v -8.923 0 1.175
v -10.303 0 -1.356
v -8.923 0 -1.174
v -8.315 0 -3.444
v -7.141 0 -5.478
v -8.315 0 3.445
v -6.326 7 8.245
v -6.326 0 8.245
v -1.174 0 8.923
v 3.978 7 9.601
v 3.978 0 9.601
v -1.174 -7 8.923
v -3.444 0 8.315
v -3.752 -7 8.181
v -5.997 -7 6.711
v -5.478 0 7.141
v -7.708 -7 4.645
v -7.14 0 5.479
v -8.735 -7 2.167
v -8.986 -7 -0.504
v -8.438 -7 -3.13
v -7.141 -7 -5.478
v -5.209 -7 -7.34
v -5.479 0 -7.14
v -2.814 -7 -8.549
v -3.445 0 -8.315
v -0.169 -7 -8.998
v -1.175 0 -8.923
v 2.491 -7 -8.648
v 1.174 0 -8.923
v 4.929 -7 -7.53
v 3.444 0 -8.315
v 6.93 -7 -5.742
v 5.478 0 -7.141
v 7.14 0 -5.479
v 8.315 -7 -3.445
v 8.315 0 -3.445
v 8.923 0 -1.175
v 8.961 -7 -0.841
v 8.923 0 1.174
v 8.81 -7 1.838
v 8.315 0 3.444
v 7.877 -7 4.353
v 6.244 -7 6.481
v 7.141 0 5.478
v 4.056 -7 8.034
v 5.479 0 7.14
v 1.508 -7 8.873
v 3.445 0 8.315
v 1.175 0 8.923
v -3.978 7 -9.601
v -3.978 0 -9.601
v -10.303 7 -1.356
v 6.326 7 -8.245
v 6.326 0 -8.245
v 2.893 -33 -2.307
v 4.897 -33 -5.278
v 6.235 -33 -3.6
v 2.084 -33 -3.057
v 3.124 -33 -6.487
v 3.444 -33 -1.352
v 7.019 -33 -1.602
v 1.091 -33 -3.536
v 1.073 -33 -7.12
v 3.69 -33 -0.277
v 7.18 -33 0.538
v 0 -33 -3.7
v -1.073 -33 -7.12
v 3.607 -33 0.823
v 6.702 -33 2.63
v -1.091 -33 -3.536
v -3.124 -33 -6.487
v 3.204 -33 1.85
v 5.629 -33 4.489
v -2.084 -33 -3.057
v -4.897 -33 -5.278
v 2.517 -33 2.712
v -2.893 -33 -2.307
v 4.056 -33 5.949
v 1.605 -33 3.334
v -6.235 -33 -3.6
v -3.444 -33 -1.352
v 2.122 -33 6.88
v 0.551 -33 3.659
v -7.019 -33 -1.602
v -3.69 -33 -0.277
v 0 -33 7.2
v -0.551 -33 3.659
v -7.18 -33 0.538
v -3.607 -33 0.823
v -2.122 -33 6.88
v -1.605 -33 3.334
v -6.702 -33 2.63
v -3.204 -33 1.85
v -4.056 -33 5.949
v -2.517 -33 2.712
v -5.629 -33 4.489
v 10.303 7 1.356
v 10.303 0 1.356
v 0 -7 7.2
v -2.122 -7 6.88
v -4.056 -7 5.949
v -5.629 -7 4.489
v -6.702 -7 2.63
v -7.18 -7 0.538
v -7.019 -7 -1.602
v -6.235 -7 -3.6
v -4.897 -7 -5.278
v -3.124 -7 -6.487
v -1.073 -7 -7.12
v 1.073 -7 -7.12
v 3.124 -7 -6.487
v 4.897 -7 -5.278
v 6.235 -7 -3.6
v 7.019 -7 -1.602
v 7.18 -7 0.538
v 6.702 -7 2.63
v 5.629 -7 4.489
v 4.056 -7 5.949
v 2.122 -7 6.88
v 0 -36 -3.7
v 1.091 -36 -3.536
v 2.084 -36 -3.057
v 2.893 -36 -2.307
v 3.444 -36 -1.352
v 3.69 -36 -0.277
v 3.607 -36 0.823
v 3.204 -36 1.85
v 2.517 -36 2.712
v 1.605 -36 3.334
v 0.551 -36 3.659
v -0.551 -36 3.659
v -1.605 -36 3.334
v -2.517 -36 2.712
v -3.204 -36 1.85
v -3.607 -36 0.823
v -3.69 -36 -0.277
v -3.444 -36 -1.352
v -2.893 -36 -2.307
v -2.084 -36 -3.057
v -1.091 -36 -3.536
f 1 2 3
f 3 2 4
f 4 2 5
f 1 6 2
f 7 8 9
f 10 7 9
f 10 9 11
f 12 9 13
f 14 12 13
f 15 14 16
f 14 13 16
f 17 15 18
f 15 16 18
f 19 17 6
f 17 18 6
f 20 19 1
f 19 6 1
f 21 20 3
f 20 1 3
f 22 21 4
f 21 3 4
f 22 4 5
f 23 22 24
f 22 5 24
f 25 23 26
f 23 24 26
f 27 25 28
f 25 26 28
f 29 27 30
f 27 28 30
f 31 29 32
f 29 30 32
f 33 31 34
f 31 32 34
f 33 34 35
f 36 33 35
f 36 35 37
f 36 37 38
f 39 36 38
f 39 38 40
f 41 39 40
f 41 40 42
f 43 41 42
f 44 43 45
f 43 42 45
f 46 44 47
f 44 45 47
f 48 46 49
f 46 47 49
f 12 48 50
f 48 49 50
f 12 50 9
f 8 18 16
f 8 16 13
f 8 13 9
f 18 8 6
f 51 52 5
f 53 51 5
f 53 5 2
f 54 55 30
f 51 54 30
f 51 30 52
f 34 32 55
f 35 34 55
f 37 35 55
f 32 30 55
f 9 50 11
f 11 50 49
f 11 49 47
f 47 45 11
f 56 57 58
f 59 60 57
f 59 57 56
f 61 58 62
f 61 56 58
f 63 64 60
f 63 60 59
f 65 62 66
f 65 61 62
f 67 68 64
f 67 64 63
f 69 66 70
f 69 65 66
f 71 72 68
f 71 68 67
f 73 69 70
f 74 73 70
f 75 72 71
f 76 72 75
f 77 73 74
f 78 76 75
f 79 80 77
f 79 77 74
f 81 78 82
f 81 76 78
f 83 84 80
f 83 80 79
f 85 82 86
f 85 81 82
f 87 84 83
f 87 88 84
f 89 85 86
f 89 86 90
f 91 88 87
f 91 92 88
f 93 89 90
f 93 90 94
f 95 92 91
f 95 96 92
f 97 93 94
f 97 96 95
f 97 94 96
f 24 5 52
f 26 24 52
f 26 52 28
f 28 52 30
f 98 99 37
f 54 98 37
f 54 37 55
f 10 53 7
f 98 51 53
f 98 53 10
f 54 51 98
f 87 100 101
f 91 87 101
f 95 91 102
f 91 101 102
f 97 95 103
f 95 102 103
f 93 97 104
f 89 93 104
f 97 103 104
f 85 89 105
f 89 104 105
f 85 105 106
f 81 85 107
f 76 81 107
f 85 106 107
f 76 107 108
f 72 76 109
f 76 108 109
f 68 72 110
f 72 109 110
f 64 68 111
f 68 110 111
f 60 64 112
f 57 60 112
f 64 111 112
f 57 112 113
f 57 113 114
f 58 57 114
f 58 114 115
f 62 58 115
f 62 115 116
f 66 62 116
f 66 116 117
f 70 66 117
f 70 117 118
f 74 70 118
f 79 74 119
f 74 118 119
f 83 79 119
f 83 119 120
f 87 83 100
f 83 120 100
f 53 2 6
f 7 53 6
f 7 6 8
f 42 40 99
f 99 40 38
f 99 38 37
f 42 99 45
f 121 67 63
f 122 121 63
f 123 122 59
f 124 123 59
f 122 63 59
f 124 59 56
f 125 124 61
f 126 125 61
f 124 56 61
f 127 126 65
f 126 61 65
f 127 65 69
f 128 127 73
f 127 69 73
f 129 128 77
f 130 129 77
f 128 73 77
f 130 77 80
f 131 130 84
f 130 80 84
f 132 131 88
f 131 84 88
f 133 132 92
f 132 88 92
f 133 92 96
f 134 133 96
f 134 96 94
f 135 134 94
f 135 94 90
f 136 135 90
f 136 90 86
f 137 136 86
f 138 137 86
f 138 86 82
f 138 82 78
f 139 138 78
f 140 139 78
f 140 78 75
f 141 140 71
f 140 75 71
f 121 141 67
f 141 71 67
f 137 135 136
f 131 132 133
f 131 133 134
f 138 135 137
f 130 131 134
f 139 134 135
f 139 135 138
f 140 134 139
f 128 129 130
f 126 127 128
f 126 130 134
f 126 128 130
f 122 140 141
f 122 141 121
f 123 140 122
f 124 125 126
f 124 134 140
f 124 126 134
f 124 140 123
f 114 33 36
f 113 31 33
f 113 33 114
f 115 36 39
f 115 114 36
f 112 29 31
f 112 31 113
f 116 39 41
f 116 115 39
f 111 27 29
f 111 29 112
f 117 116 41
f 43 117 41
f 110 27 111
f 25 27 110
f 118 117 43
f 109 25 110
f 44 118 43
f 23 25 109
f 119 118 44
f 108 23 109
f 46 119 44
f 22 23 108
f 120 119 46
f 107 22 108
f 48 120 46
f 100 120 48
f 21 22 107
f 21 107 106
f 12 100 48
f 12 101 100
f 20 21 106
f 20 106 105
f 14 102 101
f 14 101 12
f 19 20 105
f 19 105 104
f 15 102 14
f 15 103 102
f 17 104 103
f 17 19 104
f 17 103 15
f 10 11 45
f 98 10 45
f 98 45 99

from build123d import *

# Parameters (mm, degrees)
EXTRUDE_1_DEPTH = 7
SKETCH_2_R      = 9
EXTRUDE_2_DEPTH = 7
SKETCH_3_R      = 7.2
EXTRUDE_3_DEPTH = 26
SKETCH_4_R      = 3.7
EXTRUDE_4_DEPTH = 3


with BuildPart() as part:
    # 草图1 → 凸台-拉伸1 (new body)
    with BuildSketch(Plane(origin=(0, 0, 0), x_dir=(1, 0, 0), z_dir=(0, 1, 0))):
        Polygon((6.325906751, 8.245174576), (-3.977577266, 9.600983236), (-10.303484016, 1.35580866), (-6.325906751, -8.245174576), (3.977577266, -9.600983236), (10.303484016, -1.35580866), align=None)
    extrude(amount=EXTRUDE_1_DEPTH)

    # 草图2 → 凸台-拉伸2 (add)
    with BuildSketch(Plane.XZ):
        with Locations(Location((0, 0, 0), (0, 0, 97.49633363))):
            Circle(SKETCH_2_R)
    extrude(amount=EXTRUDE_2_DEPTH)

    # 草图3 → 凸台-拉伸3 (add)
    with BuildSketch(Plane.XZ.offset(7)):
        with Locations(Location((0, 0, 0), (0, 0, 90))):
            Circle(SKETCH_3_R)
    extrude(amount=EXTRUDE_3_DEPTH)

    # 草图4 → 凸台-拉伸4 (add)
    with BuildSketch(Plane.XZ.offset(33)):
        with Locations(Location((0, 0, 0), (0, 0, 270))):
            Circle(SKETCH_4_R)
    extrude(amount=EXTRUDE_4_DEPTH)


solid = part.part
